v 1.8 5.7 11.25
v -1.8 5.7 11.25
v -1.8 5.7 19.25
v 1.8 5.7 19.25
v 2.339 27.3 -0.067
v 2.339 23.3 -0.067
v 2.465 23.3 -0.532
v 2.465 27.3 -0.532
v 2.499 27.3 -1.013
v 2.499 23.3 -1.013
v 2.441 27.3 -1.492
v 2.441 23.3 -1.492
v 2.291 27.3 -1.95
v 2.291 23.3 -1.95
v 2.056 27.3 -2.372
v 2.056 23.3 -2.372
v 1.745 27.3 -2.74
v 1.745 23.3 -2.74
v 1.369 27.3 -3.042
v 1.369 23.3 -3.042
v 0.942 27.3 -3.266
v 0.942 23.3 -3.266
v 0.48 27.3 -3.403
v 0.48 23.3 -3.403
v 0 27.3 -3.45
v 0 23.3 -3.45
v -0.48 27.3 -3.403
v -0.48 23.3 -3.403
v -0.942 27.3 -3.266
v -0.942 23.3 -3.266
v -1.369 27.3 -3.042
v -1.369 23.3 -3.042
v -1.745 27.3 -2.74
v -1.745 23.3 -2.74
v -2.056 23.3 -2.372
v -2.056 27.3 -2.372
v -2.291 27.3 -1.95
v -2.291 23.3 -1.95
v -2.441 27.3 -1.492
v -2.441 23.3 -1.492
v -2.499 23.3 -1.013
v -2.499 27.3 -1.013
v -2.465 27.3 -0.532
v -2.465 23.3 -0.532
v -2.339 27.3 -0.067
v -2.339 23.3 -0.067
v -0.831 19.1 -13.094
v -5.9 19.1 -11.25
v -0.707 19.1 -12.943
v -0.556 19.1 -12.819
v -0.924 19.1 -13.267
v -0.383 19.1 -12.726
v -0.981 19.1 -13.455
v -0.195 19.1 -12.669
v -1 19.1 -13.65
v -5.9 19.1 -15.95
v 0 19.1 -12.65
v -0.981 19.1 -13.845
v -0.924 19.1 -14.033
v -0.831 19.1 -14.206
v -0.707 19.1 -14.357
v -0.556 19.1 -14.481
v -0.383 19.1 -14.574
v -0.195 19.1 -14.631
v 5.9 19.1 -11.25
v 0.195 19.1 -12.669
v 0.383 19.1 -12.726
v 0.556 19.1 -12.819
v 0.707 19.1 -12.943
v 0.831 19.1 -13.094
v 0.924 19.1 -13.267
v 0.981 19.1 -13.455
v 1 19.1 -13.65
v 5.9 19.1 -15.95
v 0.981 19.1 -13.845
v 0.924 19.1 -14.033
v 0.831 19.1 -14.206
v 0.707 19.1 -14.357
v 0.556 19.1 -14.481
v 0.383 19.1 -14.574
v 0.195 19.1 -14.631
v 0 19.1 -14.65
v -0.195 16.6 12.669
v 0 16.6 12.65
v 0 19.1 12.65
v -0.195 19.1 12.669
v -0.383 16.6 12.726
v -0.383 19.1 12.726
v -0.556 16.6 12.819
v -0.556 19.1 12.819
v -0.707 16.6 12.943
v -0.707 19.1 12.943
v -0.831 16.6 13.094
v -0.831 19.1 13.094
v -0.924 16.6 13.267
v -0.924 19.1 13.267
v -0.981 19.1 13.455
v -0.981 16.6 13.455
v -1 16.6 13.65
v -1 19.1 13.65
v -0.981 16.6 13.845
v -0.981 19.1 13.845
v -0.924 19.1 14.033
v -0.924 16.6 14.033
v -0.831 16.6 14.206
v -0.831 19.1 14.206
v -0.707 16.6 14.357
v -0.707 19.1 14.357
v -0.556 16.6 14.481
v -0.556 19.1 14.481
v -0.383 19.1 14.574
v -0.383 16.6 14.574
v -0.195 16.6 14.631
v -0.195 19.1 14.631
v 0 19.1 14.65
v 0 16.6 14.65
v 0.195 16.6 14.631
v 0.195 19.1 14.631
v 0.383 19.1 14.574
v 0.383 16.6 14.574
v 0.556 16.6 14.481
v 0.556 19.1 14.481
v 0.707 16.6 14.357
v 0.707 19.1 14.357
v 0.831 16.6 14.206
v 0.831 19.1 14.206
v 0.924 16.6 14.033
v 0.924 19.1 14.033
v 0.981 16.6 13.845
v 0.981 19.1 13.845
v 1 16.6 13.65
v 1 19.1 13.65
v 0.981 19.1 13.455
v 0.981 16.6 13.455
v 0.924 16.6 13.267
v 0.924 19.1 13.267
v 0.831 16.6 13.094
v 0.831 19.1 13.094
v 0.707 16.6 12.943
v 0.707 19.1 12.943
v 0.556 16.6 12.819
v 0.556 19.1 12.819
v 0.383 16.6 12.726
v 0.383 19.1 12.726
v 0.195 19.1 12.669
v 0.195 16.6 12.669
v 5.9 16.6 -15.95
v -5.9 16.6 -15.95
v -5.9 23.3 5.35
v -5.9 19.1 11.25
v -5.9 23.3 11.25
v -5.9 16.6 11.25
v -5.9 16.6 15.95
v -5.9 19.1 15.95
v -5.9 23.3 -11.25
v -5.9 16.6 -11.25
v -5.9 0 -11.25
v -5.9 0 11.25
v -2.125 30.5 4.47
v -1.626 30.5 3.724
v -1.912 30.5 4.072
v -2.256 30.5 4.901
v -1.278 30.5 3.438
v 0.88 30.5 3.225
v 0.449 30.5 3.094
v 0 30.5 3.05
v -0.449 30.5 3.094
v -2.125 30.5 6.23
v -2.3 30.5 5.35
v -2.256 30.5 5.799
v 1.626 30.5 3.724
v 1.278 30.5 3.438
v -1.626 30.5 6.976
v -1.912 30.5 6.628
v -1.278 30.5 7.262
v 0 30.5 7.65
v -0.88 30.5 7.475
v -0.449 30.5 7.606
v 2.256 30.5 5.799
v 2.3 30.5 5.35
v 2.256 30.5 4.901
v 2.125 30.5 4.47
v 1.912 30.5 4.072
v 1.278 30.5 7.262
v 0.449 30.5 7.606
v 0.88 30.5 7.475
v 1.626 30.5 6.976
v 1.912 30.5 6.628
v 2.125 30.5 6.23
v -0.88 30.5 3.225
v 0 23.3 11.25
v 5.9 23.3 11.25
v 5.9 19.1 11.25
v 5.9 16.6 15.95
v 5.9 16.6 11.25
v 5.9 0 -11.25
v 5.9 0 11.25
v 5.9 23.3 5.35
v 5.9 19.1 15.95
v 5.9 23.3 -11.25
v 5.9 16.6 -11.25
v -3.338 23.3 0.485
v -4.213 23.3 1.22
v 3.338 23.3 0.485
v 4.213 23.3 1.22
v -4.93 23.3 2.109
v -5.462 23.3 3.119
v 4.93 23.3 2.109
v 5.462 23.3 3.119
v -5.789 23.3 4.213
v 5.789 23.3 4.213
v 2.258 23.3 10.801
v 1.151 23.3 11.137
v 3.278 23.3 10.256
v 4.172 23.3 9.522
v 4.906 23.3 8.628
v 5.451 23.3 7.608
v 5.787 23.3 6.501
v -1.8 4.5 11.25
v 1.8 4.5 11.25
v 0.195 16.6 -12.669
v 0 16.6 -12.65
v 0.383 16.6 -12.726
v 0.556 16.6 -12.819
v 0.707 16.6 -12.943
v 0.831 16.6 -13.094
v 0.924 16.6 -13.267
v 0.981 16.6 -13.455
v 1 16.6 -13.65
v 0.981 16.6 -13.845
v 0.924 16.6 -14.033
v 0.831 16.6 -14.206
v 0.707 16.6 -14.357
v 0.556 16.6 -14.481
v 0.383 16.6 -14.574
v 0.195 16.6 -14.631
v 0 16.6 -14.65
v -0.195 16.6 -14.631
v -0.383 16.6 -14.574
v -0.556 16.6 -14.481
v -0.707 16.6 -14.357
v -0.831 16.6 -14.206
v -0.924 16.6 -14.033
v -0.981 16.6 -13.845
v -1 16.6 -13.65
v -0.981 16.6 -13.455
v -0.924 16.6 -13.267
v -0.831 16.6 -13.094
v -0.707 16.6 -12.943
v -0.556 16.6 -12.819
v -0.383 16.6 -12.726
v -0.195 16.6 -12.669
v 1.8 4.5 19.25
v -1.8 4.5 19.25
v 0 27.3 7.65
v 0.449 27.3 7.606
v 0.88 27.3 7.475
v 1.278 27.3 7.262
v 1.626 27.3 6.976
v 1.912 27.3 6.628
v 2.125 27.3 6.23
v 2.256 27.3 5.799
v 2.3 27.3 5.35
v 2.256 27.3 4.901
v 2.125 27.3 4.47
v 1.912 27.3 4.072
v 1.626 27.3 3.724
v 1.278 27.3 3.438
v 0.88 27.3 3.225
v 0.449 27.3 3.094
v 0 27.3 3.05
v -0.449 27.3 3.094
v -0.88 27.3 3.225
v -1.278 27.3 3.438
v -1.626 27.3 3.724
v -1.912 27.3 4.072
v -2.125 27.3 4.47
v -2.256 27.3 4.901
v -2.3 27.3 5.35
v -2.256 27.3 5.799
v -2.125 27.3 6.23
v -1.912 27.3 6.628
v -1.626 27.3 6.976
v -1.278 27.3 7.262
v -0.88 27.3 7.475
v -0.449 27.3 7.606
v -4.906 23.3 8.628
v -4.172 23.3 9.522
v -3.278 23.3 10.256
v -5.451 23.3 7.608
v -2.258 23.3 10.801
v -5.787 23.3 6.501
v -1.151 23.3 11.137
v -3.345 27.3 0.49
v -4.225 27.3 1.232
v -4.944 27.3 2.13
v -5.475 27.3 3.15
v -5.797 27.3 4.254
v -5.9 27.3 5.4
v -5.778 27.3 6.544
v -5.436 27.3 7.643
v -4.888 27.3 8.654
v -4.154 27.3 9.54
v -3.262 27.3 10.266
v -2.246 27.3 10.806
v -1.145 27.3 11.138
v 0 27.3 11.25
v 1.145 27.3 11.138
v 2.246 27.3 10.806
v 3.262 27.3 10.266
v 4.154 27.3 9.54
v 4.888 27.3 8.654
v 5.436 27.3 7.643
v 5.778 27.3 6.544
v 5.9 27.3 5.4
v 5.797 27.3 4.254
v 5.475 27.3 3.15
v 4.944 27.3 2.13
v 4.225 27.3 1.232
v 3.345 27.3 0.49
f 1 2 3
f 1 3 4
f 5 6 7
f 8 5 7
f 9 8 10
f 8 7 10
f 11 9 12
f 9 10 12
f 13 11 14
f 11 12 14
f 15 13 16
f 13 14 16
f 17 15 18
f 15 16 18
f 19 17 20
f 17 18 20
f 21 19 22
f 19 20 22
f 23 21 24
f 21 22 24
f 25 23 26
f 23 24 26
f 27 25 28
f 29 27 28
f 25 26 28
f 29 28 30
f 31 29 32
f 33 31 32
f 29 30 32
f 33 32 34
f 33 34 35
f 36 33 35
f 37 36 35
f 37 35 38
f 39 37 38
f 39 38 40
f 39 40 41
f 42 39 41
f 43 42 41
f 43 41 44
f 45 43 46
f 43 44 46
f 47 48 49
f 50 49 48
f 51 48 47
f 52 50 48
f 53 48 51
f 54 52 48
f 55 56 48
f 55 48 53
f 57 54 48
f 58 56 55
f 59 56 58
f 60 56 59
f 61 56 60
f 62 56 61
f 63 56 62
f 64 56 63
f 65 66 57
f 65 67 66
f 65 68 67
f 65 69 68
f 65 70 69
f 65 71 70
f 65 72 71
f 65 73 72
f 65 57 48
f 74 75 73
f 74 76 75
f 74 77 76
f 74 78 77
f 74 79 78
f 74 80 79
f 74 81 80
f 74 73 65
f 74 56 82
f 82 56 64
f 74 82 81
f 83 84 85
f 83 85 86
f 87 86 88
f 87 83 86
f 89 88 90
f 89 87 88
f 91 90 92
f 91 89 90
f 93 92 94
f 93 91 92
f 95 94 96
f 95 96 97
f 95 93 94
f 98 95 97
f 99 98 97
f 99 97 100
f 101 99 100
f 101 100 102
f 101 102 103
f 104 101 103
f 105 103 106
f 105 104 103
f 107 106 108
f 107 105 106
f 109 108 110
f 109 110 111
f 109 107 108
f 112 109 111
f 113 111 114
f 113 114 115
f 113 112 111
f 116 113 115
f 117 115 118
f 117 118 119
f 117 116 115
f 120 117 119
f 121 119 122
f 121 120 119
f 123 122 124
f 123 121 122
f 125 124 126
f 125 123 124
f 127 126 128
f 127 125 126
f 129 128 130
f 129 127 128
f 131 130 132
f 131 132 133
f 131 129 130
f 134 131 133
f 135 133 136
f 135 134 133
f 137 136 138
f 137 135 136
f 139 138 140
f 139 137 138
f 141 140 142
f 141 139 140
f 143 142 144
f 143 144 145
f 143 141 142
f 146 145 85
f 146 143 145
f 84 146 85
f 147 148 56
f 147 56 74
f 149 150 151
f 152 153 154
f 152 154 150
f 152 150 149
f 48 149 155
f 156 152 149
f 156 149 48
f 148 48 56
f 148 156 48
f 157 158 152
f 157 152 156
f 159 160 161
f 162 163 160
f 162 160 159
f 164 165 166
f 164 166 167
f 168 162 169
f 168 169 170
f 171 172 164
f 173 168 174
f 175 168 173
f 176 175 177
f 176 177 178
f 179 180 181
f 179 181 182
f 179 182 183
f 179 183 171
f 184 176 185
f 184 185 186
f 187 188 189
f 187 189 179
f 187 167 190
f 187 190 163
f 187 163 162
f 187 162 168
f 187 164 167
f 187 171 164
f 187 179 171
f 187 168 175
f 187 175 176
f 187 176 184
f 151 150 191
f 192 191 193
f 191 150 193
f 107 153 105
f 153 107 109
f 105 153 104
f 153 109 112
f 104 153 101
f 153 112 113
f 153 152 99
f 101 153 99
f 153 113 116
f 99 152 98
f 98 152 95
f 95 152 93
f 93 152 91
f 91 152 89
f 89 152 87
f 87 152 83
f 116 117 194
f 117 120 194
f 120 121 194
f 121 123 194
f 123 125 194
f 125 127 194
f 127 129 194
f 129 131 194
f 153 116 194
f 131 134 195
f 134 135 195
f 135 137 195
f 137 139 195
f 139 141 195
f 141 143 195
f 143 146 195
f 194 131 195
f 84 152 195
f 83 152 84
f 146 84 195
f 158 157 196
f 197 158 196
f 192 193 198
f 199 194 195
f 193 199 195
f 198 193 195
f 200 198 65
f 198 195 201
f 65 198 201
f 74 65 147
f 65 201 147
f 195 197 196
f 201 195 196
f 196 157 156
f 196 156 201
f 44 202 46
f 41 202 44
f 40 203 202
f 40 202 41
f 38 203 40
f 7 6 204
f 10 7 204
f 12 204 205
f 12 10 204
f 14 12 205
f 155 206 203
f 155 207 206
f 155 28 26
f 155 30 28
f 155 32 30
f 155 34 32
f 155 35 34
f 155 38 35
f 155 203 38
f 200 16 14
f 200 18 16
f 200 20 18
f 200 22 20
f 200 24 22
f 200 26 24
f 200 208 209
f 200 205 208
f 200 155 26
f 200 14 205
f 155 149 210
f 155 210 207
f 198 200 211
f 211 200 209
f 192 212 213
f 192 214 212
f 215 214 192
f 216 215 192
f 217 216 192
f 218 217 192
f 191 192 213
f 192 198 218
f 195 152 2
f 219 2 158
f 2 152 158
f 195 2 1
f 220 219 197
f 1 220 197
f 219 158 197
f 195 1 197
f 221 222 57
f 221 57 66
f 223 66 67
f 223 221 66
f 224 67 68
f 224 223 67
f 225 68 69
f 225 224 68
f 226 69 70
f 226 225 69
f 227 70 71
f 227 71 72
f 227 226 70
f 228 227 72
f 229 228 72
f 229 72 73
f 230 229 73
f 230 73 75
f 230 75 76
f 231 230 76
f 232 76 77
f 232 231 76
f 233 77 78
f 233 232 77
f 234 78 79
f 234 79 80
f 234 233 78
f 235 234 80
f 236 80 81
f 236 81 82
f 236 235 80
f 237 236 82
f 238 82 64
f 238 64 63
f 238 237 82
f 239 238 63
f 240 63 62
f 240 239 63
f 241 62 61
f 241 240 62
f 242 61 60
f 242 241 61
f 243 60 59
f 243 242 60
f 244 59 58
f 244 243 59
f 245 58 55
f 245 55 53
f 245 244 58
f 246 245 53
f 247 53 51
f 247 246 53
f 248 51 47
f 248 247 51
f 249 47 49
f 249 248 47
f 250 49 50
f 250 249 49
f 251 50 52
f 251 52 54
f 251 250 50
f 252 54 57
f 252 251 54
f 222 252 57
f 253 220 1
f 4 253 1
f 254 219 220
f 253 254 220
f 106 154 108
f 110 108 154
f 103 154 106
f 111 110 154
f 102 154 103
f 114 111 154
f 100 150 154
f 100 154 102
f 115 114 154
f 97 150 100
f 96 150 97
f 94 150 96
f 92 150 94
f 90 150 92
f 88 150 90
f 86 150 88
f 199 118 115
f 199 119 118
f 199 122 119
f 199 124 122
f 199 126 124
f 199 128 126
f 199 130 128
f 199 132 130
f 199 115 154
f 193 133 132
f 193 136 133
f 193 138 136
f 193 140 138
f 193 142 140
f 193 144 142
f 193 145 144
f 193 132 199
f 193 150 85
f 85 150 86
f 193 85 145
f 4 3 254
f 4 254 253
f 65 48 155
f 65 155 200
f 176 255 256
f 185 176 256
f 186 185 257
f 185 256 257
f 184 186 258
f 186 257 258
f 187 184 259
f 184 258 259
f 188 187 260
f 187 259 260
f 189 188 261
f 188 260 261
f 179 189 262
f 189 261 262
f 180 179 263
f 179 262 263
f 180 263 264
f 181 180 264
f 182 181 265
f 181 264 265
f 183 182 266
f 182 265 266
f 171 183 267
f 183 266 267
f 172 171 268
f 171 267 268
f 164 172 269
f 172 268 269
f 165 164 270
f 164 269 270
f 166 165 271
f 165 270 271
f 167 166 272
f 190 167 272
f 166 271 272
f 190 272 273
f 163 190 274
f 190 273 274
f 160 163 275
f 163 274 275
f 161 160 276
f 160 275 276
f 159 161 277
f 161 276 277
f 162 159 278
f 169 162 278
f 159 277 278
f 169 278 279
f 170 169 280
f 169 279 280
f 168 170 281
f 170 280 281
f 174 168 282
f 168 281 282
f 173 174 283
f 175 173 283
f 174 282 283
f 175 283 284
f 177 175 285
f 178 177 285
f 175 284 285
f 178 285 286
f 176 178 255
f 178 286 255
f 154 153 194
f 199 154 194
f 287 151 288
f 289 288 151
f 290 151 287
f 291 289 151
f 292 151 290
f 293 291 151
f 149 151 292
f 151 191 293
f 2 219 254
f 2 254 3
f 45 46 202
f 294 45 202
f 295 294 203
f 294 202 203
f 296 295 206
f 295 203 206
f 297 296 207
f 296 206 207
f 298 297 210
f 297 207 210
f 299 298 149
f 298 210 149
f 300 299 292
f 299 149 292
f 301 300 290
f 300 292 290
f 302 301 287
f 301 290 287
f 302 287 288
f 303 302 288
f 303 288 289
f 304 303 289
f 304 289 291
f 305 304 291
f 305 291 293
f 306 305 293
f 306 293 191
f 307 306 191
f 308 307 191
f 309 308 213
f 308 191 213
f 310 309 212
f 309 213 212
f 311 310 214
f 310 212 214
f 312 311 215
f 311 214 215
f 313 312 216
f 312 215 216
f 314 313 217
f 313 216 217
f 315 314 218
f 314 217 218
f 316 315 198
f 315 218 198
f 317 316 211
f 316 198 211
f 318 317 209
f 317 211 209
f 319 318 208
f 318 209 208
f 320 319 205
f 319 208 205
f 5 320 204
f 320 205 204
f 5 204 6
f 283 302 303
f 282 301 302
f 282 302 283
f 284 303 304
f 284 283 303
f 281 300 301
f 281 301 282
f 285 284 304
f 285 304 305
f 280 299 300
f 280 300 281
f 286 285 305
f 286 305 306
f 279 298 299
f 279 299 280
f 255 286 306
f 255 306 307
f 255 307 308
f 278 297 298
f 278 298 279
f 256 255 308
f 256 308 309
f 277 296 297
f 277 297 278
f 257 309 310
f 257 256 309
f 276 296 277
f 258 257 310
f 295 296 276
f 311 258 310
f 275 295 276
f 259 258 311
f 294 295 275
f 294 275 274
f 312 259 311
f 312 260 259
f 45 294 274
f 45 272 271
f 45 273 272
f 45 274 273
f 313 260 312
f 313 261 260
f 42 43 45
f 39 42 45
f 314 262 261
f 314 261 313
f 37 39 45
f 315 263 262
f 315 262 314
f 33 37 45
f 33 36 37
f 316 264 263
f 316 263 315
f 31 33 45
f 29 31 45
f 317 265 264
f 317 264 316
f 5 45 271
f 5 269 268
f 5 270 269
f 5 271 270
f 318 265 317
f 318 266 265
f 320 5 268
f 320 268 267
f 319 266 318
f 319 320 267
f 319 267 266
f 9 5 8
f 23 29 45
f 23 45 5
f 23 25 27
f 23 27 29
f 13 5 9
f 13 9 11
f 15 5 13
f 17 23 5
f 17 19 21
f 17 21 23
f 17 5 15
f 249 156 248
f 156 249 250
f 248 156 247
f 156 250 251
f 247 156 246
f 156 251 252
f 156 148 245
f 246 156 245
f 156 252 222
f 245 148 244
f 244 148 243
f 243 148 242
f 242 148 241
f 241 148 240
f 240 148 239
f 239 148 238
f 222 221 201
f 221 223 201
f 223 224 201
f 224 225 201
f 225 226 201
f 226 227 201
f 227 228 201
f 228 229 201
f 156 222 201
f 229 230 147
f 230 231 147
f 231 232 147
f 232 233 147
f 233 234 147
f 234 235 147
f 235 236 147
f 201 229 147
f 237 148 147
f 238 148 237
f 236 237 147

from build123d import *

# Parameters (mm, degrees)
SKETCH1_W           = 11.8
SKETCH1_H           = 22.5
BOSS_EXTRUDE1_DEPTH = 23.3
SKETCH2_W           = 11.8
SKETCH2_H           = 31.9
SKETCH2_R           = 1
BOSS_EXTRUDE2_DEPTH = 2.5
BOSS_EXTRUDE3_DEPTH = 4
SKETCH4_R           = 2.3
BOSS_EXTRUDE4_DEPTH = 3.2
SKETCH5_W           = 3.6
SKETCH5_H           = 1.2
BOSS_EXTRUDE5_DEPTH = 8


with BuildPart() as part:
    # Sketch1 → Boss-Extrude1 (new body)
    with BuildSketch(Plane(origin=(0, 0, 0), x_dir=(1, 0, 0), z_dir=(0, 1, 0))):
        Rectangle(SKETCH1_W, SKETCH1_H)
    extrude(amount=BOSS_EXTRUDE1_DEPTH)

    # Sketch2 → Boss-Extrude2 (add)
    with BuildSketch(Plane(origin=(0, 16.6, 0), x_dir=(1, 0, 0), z_dir=(0, 1, 0))):
        Rectangle(SKETCH2_W, SKETCH2_H)
        with Locations((0, 13.65)):
            Circle(SKETCH2_R, mode=Mode.SUBTRACT)
        with Locations((0, -13.65)):
            Circle(SKETCH2_R, mode=Mode.SUBTRACT)
    extrude(amount=BOSS_EXTRUDE2_DEPTH)

    # Sketch3 → Boss-Extrude3 (add)
    with BuildSketch(Plane(origin=(0, 23.3, 0), x_dir=(1, 0, 0), z_dir=(0, 1, 0))):
        with BuildLine():
            ThreePointArc((-2.338743727, 0.066666667), (0, -11.25), (2.338743727, 0.066666667))
            ThreePointArc((2.338743727, 0.066666667), (0, 3.45), (-2.338743727, 0.066666667))
        make_face()
    extrude(amount=BOSS_EXTRUDE3_DEPTH)

    # Sketch4 → Boss-Extrude4 (add)
    with BuildSketch(Plane(origin=(0, 27.3, 0), x_dir=(1, 0, 0), z_dir=(0, 1, 0))):
        with Locations((0, -5.35)):
            Circle(SKETCH4_R)
    extrude(amount=BOSS_EXTRUDE4_DEPTH)

    # Sketch5 → Boss-Extrude5 (add)
    with BuildSketch(Plane.XY.offset(11.25)):
        with Locations((0, 5.1)):
            Rectangle(SKETCH5_W, SKETCH5_H)
    extrude(amount=BOSS_EXTRUDE5_DEPTH)


solid = part.part
